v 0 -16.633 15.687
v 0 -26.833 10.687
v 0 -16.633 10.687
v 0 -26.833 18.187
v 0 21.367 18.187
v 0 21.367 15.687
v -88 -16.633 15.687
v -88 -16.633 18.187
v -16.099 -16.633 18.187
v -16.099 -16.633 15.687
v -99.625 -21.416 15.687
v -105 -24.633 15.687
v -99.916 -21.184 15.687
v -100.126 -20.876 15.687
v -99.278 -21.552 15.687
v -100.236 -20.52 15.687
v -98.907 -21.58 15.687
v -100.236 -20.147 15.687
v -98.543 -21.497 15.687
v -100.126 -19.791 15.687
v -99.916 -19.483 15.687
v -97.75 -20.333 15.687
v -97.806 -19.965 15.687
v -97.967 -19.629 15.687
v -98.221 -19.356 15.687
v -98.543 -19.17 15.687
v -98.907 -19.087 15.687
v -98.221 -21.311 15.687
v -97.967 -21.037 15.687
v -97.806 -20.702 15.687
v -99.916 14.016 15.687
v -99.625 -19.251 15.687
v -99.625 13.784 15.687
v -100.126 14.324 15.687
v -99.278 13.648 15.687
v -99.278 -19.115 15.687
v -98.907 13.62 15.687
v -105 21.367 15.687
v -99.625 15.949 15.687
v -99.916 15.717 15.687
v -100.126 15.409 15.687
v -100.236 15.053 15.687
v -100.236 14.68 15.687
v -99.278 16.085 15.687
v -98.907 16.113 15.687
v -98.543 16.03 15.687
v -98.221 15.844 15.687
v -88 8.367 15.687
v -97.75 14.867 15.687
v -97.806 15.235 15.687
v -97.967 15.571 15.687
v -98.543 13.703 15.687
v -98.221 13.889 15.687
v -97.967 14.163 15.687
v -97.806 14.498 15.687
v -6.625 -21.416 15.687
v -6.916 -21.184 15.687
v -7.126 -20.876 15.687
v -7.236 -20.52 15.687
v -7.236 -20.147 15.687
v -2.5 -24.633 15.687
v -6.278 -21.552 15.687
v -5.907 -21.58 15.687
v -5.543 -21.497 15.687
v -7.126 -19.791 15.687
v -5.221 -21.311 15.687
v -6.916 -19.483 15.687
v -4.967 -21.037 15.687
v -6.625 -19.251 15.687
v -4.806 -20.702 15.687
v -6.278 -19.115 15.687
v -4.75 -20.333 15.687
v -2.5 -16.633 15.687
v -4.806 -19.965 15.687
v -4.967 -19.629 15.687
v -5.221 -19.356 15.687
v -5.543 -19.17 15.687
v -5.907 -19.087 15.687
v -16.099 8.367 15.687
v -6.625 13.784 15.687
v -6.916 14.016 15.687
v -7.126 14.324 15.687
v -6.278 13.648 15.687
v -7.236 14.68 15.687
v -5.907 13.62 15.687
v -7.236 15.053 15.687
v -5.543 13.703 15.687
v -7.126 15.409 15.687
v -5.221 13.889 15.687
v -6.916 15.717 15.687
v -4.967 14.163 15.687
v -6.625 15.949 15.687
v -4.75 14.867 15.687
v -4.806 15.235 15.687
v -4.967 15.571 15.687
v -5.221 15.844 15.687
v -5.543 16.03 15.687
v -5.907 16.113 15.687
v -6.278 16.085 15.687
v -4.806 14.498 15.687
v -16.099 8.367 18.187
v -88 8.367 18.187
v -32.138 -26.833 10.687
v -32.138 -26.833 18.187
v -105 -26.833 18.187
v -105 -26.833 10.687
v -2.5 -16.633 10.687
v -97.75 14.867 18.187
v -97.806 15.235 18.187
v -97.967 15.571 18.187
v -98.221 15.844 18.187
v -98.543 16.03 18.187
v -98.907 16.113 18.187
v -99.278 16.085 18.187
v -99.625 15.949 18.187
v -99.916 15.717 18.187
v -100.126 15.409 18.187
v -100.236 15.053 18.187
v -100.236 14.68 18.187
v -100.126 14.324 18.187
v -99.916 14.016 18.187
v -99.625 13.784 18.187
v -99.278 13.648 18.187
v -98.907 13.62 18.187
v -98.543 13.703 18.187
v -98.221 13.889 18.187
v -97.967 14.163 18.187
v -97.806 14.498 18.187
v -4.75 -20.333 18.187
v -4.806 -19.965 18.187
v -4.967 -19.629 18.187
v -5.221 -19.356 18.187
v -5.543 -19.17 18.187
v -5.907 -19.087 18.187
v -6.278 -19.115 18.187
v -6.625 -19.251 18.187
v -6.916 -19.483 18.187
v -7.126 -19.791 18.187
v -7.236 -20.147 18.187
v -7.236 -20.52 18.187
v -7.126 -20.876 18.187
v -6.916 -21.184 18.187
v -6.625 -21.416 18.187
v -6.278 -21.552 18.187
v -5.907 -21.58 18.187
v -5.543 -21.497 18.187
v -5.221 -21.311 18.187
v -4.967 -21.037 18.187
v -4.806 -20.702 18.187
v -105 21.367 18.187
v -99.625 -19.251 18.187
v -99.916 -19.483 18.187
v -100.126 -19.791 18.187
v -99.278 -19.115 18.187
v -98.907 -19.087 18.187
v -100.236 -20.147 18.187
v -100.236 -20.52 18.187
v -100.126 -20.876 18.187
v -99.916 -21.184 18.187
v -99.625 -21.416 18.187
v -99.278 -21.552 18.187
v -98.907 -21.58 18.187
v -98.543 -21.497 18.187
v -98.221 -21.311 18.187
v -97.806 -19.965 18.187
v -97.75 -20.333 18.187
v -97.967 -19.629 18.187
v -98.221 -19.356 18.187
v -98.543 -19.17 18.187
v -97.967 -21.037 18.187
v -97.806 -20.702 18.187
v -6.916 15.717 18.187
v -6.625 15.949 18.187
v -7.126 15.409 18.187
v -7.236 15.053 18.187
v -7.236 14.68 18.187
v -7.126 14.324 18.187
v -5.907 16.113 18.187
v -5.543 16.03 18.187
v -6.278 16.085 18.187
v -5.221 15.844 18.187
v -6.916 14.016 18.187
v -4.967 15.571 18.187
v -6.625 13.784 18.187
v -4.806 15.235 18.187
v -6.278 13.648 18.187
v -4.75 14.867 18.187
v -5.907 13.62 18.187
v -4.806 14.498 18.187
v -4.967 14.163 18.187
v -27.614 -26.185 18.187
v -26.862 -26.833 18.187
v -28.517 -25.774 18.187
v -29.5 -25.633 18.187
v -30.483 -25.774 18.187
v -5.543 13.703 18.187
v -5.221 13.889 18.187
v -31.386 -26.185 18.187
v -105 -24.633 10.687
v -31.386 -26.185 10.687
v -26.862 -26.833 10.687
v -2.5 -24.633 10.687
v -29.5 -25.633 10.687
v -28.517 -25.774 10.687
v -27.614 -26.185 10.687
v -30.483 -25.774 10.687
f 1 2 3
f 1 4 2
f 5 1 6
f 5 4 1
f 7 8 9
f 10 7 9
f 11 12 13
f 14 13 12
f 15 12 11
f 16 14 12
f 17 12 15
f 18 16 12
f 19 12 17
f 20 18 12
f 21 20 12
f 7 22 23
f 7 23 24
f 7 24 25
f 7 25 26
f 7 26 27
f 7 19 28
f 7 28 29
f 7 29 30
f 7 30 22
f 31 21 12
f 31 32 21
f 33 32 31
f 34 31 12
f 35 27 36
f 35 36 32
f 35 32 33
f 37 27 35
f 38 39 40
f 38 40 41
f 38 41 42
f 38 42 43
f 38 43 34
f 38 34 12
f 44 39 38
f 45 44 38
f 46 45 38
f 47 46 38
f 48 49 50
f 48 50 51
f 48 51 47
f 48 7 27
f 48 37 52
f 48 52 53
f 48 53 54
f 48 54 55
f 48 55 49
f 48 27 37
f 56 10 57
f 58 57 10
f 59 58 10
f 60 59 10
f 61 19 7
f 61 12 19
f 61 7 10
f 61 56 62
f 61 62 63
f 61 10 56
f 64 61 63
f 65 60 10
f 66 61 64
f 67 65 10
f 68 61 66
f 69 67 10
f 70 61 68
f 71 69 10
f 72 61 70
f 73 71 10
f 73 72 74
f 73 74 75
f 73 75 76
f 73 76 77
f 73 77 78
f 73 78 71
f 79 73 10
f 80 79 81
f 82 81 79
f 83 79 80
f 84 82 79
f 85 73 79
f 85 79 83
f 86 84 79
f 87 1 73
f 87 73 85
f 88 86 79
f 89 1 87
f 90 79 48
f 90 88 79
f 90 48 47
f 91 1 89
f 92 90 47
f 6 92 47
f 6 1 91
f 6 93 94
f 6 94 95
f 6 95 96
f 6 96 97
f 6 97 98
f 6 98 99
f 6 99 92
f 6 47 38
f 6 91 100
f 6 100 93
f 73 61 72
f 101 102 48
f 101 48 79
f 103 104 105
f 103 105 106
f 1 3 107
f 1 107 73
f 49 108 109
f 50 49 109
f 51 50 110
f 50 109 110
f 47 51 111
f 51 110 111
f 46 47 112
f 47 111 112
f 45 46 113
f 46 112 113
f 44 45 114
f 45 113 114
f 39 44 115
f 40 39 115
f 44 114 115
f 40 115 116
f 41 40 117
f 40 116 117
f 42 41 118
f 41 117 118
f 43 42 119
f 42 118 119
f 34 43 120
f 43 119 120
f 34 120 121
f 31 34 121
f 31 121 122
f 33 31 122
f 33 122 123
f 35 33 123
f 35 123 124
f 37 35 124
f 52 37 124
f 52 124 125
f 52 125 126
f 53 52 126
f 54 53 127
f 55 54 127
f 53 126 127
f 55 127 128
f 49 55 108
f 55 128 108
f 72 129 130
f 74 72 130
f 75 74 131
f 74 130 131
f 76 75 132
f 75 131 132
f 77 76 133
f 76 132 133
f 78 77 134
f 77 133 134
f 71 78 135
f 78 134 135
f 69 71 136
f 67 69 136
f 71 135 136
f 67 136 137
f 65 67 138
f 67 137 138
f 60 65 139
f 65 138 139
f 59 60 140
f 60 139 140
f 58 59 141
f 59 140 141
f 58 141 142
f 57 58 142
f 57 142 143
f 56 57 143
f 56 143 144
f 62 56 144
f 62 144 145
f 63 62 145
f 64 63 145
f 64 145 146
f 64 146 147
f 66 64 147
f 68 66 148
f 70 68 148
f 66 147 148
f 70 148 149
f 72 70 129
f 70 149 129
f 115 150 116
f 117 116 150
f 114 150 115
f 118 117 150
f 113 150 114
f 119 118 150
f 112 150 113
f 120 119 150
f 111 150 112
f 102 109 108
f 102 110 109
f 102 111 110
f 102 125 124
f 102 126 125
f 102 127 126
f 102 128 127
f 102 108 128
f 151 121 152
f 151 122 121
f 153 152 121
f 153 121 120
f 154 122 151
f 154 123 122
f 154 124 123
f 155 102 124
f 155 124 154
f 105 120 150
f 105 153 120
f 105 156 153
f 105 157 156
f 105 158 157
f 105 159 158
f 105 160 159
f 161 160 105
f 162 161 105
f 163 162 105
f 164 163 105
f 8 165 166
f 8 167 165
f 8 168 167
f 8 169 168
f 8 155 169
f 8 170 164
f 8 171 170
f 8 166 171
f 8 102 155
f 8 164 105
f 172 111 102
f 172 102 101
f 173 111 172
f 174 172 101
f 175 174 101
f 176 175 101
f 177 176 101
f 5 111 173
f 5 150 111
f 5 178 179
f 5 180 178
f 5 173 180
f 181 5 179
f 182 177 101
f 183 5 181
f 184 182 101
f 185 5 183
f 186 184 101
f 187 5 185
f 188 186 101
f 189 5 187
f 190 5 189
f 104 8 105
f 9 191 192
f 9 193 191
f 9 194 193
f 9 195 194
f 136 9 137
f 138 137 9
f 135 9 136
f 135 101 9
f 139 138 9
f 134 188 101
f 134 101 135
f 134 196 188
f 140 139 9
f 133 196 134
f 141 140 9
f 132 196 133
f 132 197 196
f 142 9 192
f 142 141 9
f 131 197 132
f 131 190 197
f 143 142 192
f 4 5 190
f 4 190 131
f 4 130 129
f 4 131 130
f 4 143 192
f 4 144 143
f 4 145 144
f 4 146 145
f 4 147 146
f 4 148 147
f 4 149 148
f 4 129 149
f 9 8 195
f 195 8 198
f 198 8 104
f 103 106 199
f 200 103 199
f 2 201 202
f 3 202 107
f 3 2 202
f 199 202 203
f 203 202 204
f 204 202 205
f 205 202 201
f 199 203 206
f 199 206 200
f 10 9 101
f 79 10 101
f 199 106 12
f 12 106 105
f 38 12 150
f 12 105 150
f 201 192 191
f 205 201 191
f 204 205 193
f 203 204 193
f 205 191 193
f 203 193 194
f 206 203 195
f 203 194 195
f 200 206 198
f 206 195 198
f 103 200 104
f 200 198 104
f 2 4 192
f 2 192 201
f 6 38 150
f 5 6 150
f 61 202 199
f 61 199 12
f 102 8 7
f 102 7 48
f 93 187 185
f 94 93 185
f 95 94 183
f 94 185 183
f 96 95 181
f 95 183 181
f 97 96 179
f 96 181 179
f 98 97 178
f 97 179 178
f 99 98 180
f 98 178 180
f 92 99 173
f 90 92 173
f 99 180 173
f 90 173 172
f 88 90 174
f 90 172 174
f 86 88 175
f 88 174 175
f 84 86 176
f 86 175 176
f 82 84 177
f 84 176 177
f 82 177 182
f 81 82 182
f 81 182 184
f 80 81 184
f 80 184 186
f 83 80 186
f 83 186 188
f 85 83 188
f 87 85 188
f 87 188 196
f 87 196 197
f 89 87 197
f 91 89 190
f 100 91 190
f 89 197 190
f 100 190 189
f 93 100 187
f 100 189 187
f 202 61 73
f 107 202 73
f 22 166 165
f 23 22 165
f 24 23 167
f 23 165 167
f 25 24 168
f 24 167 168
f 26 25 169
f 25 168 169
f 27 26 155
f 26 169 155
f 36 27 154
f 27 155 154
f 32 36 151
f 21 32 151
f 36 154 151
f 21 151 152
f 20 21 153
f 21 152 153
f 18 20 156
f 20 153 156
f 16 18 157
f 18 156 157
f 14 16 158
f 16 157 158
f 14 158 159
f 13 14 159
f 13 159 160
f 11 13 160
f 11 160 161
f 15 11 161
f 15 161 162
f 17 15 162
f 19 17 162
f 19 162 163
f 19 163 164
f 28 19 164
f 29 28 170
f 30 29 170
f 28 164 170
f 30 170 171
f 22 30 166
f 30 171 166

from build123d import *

# Parameters (mm, degrees)
F0_W     = 2.2
F0_H     = 5
F1_DEPTH = 105
F2_R     = 1.25
F3_DEPTH = 2.5
F4_W     = 71.900862
F4_H     = 25
F5_DEPTH = 7.5
F0_W_2   = 8
F6_DEPTH = 2.5


with BuildPart() as f1:
    # F0 (on Right) → F1 (new body)
    with BuildSketch(Plane.YZ):
        with Locations((-25.733312, 13.186514)):
            Rectangle(F0_W, F0_H)
        Polygon((-26.833312, 15.686514), (-24.633312, 15.686514), (-16.633312, 15.686514), (21.366688, 15.686514), (21.366688, 18.186514), (-26.833312, 18.186514), align=None)
    extrude(amount=-F1_DEPTH)

    # F2 (on face) → F3 (cut)
    with BuildSketch(Plane.XY.offset(18.186514)):
        with Locations((-99, 14.866688)):
            Circle(F2_R)
        with Locations((-6, 14.866688)):
            Circle(F2_R)
        with Locations((-6, -20.333312)):
            Circle(F2_R)
        with Locations((-99, -20.333312)):
            Circle(F2_R)
    extrude(amount=-F3_DEPTH, mode=Mode.SUBTRACT)

    # F4 (on face) → F5 (cut)
    with BuildSketch(Plane.XY.offset(18.186514)):
        with Locations((-52.049569, -4.133312)):
            Rectangle(F4_W, F4_H)
        with BuildLine():
            Line((-32.138181, -26.833312), (-26.861819, -26.833312))
            ThreePointArc((-26.861819, -26.833312), (-29.5, -25.633312), (-32.138181, -26.833312))
        make_face()
    extrude(amount=-F5_DEPTH, mode=Mode.SUBTRACT)

    # F0 (on Right) → F6 (join)
    with BuildSketch(Plane.YZ):
        with Locations((-20.633312, 13.186514)):
            Rectangle(F0_W_2, F0_H)
    extrude(amount=-F6_DEPTH)


solid = f1.part
